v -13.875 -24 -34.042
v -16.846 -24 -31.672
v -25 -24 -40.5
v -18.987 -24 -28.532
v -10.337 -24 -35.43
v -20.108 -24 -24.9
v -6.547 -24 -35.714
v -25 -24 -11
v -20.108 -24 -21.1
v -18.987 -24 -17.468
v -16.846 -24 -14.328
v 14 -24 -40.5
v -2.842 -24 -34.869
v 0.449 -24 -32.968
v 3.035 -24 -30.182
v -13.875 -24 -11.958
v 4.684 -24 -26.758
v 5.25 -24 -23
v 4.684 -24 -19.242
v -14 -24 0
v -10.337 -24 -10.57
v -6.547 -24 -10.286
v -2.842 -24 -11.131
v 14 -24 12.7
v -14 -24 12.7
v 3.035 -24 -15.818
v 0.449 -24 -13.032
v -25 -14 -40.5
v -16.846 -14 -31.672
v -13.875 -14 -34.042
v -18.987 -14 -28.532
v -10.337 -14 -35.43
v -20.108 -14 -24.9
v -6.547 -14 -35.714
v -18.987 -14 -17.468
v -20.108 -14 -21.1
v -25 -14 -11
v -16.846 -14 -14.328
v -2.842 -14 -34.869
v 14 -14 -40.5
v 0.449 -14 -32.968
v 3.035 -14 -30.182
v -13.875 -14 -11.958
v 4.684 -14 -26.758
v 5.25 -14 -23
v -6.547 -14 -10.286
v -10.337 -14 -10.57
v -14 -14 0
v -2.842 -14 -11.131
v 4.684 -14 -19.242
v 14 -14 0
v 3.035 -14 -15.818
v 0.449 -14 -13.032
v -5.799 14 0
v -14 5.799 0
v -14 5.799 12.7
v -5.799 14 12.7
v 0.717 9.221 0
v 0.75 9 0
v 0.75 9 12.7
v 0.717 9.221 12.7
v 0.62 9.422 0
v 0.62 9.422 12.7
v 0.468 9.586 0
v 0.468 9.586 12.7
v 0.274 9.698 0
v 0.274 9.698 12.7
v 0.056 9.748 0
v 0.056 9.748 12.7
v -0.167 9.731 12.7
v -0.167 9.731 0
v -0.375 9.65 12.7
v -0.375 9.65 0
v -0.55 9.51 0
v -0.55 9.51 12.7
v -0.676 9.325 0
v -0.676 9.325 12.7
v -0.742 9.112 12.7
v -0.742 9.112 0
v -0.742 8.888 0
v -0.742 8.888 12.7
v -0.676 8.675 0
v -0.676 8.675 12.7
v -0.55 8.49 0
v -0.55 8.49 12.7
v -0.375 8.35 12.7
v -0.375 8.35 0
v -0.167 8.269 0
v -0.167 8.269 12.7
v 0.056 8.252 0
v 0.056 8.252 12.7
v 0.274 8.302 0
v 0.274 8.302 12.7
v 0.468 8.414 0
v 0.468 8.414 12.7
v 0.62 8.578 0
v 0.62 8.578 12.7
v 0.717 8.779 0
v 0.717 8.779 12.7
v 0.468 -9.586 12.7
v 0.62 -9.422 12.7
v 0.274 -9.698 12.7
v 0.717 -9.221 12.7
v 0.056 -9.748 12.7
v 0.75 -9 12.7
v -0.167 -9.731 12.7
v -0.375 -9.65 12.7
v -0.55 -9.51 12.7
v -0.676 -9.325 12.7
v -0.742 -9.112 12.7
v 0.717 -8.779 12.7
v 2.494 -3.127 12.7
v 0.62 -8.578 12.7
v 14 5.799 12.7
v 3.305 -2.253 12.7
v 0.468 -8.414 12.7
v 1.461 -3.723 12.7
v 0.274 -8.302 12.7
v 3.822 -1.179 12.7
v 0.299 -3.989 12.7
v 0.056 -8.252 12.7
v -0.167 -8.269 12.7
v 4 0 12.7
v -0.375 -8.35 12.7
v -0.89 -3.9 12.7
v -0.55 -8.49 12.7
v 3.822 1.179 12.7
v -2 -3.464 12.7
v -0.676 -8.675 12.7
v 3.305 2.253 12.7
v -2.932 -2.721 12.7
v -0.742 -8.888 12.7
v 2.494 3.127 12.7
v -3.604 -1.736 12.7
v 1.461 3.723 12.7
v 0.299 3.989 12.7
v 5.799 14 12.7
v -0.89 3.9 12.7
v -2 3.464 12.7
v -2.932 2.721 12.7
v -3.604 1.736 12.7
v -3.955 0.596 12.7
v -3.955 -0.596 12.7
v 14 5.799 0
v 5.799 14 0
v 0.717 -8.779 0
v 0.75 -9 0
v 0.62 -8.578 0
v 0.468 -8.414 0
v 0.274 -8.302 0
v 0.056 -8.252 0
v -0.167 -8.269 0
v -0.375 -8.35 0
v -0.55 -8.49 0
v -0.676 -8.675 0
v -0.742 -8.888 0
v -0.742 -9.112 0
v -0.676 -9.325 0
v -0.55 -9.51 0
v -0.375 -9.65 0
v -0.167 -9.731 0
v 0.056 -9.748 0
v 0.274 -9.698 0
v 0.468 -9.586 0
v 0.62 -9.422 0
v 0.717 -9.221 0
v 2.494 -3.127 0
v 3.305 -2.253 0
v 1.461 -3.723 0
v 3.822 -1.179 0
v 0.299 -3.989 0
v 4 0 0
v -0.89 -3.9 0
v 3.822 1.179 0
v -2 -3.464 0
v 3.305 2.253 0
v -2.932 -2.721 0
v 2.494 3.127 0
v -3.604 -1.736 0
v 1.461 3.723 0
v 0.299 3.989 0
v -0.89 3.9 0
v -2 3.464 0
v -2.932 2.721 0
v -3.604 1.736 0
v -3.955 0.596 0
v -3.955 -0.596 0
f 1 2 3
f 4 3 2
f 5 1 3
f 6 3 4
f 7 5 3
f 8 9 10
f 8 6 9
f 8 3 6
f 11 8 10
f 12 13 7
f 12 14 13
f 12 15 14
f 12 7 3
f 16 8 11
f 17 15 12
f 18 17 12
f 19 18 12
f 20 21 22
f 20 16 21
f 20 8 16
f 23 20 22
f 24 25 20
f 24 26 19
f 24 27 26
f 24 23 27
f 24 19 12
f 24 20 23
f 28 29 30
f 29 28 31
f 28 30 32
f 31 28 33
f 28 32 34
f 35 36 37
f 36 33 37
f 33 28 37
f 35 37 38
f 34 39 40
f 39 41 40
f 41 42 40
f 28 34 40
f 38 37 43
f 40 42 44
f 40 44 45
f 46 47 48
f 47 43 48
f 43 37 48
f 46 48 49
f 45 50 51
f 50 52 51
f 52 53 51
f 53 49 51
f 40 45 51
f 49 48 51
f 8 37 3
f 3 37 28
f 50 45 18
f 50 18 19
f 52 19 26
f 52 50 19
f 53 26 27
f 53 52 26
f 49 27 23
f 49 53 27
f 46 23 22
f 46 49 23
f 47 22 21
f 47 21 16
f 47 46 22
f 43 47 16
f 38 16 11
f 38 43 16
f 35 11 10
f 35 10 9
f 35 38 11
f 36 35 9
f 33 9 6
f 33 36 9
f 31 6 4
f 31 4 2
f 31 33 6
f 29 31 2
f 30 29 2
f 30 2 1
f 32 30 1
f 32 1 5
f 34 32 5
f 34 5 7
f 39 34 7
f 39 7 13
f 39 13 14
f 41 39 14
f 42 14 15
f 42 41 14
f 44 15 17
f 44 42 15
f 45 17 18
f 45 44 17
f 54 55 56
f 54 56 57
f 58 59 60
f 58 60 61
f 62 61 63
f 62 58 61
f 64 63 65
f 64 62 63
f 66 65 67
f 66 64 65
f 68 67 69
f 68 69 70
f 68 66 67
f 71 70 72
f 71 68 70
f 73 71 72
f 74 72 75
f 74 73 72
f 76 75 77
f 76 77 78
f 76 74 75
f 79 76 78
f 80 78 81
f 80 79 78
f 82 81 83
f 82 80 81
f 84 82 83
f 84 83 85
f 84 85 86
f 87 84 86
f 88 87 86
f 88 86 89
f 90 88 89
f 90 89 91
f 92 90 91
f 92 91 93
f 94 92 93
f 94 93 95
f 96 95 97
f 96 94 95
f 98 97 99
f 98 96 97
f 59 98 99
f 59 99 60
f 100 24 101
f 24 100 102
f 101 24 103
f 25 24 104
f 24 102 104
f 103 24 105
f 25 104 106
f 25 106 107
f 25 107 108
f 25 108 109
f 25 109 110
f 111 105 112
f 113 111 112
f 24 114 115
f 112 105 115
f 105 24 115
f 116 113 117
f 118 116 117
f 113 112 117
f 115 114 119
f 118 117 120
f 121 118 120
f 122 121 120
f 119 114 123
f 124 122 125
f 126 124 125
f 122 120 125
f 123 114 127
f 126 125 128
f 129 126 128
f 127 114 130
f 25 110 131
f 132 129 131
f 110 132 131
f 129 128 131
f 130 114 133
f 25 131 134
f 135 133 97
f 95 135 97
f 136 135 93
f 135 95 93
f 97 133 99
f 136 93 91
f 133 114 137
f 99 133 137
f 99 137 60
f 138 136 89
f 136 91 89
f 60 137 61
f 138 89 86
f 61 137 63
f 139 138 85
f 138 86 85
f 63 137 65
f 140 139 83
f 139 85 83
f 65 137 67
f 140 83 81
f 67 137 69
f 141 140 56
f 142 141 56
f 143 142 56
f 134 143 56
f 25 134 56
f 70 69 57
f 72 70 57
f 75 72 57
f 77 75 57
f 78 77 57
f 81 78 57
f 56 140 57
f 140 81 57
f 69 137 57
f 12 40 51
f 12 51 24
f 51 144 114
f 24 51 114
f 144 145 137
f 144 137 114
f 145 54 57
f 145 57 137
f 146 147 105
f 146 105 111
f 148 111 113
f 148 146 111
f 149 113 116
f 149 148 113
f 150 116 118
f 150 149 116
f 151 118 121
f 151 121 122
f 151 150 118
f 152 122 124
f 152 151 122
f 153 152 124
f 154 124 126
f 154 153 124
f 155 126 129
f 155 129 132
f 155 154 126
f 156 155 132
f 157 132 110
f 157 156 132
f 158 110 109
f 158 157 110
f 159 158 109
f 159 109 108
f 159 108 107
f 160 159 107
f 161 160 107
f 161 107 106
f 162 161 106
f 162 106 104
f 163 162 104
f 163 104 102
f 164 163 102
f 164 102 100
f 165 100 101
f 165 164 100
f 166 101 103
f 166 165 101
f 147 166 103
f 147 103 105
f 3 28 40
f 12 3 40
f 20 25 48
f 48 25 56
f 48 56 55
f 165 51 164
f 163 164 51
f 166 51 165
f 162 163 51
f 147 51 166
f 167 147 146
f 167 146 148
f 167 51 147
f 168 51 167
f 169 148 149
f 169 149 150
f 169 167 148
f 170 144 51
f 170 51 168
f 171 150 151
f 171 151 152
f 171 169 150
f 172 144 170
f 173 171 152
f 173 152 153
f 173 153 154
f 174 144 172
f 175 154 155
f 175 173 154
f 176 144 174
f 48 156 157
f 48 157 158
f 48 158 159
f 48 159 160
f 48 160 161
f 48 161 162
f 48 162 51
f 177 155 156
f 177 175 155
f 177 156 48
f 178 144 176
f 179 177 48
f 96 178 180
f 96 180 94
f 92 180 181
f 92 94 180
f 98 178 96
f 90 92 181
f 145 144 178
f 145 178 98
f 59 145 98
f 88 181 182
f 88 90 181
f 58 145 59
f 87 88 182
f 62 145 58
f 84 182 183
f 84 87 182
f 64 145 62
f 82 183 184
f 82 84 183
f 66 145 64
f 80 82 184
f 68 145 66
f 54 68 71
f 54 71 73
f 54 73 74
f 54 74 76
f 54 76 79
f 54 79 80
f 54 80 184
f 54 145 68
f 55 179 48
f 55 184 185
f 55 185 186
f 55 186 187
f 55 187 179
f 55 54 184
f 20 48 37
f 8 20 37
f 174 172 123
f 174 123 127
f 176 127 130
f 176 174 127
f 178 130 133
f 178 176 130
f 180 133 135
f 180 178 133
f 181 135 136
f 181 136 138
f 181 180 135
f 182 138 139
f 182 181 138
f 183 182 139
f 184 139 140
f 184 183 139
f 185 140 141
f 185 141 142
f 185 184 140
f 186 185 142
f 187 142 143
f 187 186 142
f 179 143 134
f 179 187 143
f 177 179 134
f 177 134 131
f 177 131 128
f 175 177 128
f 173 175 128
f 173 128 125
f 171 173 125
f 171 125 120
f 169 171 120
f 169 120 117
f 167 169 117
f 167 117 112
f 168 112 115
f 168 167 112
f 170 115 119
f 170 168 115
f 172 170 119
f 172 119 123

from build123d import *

# Parameters (mm, degrees)
SKETCH1_R           = 4
SKETCH1_R_2         = 0.75
BOSS_EXTRUDE1_DEPTH = 12.7
SKETCH2_R           = 12.75
BOSS_EXTRUDE2_DEPTH = 10


with BuildPart() as part:
    # Sketch1 → Boss-Extrude1 (new body)
    with BuildSketch(Plane.XY):
        Polygon((-5.798989873, 14), (5.798989873, 14), (14, 5.798989873), (14, -5.798989873), (14, -14), (5.798989873, -14), (-5.798989873, -14), (-14, -14), (-14, -5.798989873), (-14, 5.798989873), align=None)
        Circle(SKETCH1_R, mode=Mode.SUBTRACT)
        with Locations((0, 9)):
            Circle(SKETCH1_R_2, mode=Mode.SUBTRACT)
        with Locations((0, -9)):
            Circle(SKETCH1_R_2, mode=Mode.SUBTRACT)
    extrude(amount=BOSS_EXTRUDE1_DEPTH)

    # Sketch2 → Boss-Extrude2 (add)
    with BuildSketch(Plane.XZ.offset(14)):
        Polygon((14, 12.7), (-14, 12.7), (-14, 0), (-25, -11), (-25, -40.5), (14, -40.5), align=None)
        with Locations((-7.5, -23)):
            Circle(SKETCH2_R, mode=Mode.SUBTRACT)
    extrude(amount=BOSS_EXTRUDE2_DEPTH)


solid = part.part
